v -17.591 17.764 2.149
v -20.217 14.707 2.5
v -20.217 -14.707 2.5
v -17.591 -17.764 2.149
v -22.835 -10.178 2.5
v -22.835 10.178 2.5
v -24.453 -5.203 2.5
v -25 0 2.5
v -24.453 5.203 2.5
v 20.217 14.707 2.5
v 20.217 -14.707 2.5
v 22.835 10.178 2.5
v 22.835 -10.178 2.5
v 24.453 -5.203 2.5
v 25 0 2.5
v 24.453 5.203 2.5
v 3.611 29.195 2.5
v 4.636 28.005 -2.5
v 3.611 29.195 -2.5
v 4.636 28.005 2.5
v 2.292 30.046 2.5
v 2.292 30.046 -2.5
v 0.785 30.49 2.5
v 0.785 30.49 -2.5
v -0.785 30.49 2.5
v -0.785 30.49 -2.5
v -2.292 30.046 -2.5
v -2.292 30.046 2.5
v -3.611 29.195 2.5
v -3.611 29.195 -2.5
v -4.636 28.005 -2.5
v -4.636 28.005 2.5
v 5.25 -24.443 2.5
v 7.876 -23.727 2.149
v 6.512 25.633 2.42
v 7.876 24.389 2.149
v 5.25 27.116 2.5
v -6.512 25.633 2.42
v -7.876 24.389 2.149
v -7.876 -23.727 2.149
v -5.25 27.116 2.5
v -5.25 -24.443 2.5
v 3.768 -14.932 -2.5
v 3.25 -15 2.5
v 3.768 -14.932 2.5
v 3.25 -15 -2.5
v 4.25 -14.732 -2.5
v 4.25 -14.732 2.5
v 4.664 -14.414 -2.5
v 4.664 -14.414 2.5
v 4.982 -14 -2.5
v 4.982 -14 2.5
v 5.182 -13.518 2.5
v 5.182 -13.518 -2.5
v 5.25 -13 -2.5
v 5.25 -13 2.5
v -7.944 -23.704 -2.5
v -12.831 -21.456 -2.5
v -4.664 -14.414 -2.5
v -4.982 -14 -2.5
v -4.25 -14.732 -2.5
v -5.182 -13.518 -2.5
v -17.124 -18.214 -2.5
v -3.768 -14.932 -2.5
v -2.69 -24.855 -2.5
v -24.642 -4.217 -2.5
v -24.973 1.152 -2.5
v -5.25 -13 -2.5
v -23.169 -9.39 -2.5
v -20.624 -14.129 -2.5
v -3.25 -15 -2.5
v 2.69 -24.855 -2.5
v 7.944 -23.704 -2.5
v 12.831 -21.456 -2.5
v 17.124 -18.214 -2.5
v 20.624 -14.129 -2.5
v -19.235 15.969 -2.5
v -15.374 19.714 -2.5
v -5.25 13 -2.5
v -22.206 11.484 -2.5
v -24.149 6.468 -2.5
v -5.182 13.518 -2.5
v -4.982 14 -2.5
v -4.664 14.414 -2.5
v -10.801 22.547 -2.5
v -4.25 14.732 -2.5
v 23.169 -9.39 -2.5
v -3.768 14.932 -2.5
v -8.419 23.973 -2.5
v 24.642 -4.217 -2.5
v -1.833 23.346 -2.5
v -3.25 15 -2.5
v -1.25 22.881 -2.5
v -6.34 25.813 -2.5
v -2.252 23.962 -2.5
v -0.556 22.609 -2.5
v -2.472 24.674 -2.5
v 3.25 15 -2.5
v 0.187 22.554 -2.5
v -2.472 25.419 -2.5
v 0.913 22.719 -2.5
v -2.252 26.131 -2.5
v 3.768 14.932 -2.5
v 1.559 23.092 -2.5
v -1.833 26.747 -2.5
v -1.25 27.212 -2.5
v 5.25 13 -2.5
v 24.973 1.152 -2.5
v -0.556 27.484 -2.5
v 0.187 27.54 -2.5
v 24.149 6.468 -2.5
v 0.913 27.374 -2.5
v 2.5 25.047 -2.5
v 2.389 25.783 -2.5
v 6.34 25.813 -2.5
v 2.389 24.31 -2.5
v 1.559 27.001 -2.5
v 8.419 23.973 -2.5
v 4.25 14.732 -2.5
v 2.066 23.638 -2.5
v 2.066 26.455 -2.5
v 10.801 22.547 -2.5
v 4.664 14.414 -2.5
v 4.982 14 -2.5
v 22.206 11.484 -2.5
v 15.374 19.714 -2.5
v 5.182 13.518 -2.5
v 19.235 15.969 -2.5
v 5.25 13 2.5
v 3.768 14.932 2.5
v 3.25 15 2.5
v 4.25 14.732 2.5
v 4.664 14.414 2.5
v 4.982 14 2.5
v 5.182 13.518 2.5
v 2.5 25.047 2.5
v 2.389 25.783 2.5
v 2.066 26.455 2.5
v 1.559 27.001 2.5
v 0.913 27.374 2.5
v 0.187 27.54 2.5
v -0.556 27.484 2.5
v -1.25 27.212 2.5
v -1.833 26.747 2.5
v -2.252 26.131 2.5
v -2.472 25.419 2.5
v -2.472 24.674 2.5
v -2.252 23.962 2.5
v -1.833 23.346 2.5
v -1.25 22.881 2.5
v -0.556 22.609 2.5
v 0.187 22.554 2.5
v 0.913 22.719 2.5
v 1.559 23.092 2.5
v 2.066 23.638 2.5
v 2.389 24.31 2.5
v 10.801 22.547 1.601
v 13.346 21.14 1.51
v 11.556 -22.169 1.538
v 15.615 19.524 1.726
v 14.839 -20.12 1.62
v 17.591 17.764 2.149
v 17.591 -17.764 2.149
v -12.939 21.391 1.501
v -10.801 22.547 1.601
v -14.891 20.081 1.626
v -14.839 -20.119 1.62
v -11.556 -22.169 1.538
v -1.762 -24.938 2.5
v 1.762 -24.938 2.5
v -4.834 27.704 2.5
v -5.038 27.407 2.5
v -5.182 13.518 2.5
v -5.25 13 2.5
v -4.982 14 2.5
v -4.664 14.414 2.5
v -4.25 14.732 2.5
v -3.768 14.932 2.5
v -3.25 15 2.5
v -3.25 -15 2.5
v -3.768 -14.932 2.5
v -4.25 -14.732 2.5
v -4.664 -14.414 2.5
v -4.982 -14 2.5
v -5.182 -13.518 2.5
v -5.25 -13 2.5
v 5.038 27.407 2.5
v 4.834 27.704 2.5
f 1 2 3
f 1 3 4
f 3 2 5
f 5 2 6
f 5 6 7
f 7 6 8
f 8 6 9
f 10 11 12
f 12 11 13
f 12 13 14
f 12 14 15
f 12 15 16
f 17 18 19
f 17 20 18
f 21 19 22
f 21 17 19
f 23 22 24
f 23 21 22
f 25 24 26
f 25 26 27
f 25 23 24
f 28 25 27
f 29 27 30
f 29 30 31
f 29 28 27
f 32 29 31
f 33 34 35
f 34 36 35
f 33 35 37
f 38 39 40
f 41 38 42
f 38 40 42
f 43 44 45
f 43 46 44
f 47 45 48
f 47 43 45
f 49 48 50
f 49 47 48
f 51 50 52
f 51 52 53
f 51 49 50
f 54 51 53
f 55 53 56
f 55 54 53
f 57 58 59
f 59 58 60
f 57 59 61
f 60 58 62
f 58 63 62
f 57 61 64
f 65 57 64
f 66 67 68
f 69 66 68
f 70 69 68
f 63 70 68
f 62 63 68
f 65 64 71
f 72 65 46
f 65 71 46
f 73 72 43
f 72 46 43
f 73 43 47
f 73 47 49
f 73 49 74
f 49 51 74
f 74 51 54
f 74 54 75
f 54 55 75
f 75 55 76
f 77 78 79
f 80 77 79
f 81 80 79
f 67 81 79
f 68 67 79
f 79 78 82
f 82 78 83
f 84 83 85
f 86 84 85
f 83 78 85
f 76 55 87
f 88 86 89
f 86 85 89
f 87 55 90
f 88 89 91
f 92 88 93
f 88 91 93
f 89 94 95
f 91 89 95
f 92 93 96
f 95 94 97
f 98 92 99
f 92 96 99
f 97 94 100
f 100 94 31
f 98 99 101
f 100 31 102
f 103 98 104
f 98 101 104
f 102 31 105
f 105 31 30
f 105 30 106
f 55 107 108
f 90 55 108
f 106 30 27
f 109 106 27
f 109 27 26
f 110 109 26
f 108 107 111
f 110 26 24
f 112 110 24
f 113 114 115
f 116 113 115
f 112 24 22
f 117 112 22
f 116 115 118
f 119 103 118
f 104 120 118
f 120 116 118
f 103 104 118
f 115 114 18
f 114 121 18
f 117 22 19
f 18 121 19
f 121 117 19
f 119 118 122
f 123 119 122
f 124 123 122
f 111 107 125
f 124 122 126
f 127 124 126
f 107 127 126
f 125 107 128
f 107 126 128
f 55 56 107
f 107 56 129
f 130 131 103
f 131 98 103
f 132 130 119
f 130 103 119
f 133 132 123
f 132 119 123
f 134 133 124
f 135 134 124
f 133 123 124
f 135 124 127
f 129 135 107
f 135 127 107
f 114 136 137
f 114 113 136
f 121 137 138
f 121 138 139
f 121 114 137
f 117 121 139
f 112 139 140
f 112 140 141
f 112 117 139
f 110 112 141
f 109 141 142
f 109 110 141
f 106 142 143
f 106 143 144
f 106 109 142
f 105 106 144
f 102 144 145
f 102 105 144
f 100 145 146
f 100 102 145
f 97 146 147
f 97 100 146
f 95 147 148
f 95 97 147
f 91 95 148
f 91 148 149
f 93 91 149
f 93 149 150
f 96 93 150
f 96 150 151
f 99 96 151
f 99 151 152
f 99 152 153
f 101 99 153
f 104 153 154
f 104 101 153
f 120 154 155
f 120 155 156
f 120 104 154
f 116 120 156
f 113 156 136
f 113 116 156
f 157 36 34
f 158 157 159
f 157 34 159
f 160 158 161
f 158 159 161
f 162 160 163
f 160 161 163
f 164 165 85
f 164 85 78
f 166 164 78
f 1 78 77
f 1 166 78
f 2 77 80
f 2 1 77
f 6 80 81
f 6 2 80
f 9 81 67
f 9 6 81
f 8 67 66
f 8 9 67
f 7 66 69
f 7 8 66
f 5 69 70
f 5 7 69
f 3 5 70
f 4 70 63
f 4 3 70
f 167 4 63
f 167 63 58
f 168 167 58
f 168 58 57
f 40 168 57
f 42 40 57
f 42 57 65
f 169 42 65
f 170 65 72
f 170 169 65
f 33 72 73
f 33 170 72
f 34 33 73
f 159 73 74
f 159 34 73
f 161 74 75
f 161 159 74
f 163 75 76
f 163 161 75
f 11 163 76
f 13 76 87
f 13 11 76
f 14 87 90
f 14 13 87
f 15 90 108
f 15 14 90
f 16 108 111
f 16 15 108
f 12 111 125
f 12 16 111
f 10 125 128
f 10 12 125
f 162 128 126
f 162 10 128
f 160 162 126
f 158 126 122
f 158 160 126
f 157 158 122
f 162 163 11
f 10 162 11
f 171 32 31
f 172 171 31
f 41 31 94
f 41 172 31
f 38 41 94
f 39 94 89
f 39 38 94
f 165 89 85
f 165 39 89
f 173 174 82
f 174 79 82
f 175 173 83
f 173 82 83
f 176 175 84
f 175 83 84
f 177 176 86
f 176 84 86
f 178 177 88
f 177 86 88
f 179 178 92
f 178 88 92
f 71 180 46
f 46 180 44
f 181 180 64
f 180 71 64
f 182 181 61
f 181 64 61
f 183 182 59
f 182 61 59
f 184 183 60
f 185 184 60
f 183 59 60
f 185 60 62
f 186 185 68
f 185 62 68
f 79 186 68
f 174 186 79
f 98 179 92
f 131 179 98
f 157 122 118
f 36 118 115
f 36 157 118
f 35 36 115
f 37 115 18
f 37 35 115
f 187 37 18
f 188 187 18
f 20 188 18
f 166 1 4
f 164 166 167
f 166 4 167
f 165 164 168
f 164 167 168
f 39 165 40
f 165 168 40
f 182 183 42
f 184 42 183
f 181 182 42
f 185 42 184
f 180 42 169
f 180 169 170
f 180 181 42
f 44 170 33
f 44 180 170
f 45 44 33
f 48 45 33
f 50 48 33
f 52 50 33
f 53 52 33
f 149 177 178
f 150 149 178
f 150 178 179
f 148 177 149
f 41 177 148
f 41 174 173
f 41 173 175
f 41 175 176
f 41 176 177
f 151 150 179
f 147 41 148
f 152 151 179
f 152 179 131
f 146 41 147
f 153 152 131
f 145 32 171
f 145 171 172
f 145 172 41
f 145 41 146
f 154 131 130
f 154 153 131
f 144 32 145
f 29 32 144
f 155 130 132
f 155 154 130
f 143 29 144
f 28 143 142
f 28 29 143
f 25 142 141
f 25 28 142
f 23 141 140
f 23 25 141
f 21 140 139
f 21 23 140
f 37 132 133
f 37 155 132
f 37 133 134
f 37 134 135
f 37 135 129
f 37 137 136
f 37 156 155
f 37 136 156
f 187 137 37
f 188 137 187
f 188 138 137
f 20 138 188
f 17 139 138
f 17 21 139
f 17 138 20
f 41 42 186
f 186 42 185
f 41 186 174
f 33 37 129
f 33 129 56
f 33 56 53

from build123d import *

# Parameters (mm, degrees)
F0_R          = 2.5
F1_DEPTH      = 2.5
F2_W          = 10.5
F2_H          = 30
F3_DEPTH      = 5.001
F5_DEPTH      = 30.5475219467
F5_DEPTH_BACK = 25.001
F6_R          = 9.99999
F7_R          = 2


# Not quite as in the source:
# - a fillet or chamfer is up to 0.001 mm smaller than in the source, because OpenCascade refuses the exact size


with BuildPart() as f1:
    # F0 (on Top) → F1 (new body, symmetric)
    with BuildSketch(Plane.XY):
        with BuildLine():
            ThreePointArc((-4.6363826998, 28.0052303576), (-7.3366406052, 24.8446324714), (-10.8006642439, 22.5465219467))
            ThreePointArc((-10.8006642439, 22.5465219467), (0, -25), (10.8006642439, 22.5465219467))
            ThreePointArc((10.8006642439, 22.5465219467), (7.3366406052, 24.8446324714), (4.6363826998, 28.0052303576))
            ThreePointArc((4.6363826998, 28.0052303576), (0, 30.5465219467), (-4.6363826998, 28.0052303576))
        make_face()
        with Locations((0, 25.0465219467)):
            Circle(F0_R, mode=Mode.SUBTRACT)
    extrude(amount=F1_DEPTH, both=True)

    # F2 (on face) → F3 (cut, through all)
    with BuildSketch(Plane.XY.offset(2.5)):
        Rectangle(F2_W, F2_H)
    extrude(amount=-F3_DEPTH, mode=Mode.SUBTRACT)

    # F4 (on Front) → F5 (cut, two sides)
    with BuildSketch(Plane.XZ) as f5_sk:
        with BuildLine():
            ThreePointArc((0, 6.579392902), (31.2333147735, 20), (0, 33.420607098))
            ThreePointArc((0, 33.420607098), (-31.2333147735, 20), (0, 6.579392902))
        make_face()
    extrude(amount=-F5_DEPTH, mode=Mode.SUBTRACT)
    extrude(f5_sk.sketch, amount=F5_DEPTH_BACK, mode=Mode.SUBTRACT)

    # F6 (radius 10 in the source; OpenCascade refuses exactly that, so slightly less here)
    f6_edges = [f1.edges().sort_by_distance(p)[0] for p in [
        (-6.733315, 0.666562, 2.5),
        (-18.733315, 0, 2.5),
        (6.733315, 0.666562, 2.5),
        (18.733315, 0, 2.5),
    ]]
    fillet(f6_edges, radius=F6_R)

    # F7
    f7_edges = [f1.edges().sort_by_distance(p)[0] for p in [
        (5.25, 15, 0),
        (5.25, -15, 0),
        (-5.25, -15, 0),
        (-5.25, 15, 0),
    ]]
    fillet(f7_edges, radius=F7_R)


solid = f1.part
